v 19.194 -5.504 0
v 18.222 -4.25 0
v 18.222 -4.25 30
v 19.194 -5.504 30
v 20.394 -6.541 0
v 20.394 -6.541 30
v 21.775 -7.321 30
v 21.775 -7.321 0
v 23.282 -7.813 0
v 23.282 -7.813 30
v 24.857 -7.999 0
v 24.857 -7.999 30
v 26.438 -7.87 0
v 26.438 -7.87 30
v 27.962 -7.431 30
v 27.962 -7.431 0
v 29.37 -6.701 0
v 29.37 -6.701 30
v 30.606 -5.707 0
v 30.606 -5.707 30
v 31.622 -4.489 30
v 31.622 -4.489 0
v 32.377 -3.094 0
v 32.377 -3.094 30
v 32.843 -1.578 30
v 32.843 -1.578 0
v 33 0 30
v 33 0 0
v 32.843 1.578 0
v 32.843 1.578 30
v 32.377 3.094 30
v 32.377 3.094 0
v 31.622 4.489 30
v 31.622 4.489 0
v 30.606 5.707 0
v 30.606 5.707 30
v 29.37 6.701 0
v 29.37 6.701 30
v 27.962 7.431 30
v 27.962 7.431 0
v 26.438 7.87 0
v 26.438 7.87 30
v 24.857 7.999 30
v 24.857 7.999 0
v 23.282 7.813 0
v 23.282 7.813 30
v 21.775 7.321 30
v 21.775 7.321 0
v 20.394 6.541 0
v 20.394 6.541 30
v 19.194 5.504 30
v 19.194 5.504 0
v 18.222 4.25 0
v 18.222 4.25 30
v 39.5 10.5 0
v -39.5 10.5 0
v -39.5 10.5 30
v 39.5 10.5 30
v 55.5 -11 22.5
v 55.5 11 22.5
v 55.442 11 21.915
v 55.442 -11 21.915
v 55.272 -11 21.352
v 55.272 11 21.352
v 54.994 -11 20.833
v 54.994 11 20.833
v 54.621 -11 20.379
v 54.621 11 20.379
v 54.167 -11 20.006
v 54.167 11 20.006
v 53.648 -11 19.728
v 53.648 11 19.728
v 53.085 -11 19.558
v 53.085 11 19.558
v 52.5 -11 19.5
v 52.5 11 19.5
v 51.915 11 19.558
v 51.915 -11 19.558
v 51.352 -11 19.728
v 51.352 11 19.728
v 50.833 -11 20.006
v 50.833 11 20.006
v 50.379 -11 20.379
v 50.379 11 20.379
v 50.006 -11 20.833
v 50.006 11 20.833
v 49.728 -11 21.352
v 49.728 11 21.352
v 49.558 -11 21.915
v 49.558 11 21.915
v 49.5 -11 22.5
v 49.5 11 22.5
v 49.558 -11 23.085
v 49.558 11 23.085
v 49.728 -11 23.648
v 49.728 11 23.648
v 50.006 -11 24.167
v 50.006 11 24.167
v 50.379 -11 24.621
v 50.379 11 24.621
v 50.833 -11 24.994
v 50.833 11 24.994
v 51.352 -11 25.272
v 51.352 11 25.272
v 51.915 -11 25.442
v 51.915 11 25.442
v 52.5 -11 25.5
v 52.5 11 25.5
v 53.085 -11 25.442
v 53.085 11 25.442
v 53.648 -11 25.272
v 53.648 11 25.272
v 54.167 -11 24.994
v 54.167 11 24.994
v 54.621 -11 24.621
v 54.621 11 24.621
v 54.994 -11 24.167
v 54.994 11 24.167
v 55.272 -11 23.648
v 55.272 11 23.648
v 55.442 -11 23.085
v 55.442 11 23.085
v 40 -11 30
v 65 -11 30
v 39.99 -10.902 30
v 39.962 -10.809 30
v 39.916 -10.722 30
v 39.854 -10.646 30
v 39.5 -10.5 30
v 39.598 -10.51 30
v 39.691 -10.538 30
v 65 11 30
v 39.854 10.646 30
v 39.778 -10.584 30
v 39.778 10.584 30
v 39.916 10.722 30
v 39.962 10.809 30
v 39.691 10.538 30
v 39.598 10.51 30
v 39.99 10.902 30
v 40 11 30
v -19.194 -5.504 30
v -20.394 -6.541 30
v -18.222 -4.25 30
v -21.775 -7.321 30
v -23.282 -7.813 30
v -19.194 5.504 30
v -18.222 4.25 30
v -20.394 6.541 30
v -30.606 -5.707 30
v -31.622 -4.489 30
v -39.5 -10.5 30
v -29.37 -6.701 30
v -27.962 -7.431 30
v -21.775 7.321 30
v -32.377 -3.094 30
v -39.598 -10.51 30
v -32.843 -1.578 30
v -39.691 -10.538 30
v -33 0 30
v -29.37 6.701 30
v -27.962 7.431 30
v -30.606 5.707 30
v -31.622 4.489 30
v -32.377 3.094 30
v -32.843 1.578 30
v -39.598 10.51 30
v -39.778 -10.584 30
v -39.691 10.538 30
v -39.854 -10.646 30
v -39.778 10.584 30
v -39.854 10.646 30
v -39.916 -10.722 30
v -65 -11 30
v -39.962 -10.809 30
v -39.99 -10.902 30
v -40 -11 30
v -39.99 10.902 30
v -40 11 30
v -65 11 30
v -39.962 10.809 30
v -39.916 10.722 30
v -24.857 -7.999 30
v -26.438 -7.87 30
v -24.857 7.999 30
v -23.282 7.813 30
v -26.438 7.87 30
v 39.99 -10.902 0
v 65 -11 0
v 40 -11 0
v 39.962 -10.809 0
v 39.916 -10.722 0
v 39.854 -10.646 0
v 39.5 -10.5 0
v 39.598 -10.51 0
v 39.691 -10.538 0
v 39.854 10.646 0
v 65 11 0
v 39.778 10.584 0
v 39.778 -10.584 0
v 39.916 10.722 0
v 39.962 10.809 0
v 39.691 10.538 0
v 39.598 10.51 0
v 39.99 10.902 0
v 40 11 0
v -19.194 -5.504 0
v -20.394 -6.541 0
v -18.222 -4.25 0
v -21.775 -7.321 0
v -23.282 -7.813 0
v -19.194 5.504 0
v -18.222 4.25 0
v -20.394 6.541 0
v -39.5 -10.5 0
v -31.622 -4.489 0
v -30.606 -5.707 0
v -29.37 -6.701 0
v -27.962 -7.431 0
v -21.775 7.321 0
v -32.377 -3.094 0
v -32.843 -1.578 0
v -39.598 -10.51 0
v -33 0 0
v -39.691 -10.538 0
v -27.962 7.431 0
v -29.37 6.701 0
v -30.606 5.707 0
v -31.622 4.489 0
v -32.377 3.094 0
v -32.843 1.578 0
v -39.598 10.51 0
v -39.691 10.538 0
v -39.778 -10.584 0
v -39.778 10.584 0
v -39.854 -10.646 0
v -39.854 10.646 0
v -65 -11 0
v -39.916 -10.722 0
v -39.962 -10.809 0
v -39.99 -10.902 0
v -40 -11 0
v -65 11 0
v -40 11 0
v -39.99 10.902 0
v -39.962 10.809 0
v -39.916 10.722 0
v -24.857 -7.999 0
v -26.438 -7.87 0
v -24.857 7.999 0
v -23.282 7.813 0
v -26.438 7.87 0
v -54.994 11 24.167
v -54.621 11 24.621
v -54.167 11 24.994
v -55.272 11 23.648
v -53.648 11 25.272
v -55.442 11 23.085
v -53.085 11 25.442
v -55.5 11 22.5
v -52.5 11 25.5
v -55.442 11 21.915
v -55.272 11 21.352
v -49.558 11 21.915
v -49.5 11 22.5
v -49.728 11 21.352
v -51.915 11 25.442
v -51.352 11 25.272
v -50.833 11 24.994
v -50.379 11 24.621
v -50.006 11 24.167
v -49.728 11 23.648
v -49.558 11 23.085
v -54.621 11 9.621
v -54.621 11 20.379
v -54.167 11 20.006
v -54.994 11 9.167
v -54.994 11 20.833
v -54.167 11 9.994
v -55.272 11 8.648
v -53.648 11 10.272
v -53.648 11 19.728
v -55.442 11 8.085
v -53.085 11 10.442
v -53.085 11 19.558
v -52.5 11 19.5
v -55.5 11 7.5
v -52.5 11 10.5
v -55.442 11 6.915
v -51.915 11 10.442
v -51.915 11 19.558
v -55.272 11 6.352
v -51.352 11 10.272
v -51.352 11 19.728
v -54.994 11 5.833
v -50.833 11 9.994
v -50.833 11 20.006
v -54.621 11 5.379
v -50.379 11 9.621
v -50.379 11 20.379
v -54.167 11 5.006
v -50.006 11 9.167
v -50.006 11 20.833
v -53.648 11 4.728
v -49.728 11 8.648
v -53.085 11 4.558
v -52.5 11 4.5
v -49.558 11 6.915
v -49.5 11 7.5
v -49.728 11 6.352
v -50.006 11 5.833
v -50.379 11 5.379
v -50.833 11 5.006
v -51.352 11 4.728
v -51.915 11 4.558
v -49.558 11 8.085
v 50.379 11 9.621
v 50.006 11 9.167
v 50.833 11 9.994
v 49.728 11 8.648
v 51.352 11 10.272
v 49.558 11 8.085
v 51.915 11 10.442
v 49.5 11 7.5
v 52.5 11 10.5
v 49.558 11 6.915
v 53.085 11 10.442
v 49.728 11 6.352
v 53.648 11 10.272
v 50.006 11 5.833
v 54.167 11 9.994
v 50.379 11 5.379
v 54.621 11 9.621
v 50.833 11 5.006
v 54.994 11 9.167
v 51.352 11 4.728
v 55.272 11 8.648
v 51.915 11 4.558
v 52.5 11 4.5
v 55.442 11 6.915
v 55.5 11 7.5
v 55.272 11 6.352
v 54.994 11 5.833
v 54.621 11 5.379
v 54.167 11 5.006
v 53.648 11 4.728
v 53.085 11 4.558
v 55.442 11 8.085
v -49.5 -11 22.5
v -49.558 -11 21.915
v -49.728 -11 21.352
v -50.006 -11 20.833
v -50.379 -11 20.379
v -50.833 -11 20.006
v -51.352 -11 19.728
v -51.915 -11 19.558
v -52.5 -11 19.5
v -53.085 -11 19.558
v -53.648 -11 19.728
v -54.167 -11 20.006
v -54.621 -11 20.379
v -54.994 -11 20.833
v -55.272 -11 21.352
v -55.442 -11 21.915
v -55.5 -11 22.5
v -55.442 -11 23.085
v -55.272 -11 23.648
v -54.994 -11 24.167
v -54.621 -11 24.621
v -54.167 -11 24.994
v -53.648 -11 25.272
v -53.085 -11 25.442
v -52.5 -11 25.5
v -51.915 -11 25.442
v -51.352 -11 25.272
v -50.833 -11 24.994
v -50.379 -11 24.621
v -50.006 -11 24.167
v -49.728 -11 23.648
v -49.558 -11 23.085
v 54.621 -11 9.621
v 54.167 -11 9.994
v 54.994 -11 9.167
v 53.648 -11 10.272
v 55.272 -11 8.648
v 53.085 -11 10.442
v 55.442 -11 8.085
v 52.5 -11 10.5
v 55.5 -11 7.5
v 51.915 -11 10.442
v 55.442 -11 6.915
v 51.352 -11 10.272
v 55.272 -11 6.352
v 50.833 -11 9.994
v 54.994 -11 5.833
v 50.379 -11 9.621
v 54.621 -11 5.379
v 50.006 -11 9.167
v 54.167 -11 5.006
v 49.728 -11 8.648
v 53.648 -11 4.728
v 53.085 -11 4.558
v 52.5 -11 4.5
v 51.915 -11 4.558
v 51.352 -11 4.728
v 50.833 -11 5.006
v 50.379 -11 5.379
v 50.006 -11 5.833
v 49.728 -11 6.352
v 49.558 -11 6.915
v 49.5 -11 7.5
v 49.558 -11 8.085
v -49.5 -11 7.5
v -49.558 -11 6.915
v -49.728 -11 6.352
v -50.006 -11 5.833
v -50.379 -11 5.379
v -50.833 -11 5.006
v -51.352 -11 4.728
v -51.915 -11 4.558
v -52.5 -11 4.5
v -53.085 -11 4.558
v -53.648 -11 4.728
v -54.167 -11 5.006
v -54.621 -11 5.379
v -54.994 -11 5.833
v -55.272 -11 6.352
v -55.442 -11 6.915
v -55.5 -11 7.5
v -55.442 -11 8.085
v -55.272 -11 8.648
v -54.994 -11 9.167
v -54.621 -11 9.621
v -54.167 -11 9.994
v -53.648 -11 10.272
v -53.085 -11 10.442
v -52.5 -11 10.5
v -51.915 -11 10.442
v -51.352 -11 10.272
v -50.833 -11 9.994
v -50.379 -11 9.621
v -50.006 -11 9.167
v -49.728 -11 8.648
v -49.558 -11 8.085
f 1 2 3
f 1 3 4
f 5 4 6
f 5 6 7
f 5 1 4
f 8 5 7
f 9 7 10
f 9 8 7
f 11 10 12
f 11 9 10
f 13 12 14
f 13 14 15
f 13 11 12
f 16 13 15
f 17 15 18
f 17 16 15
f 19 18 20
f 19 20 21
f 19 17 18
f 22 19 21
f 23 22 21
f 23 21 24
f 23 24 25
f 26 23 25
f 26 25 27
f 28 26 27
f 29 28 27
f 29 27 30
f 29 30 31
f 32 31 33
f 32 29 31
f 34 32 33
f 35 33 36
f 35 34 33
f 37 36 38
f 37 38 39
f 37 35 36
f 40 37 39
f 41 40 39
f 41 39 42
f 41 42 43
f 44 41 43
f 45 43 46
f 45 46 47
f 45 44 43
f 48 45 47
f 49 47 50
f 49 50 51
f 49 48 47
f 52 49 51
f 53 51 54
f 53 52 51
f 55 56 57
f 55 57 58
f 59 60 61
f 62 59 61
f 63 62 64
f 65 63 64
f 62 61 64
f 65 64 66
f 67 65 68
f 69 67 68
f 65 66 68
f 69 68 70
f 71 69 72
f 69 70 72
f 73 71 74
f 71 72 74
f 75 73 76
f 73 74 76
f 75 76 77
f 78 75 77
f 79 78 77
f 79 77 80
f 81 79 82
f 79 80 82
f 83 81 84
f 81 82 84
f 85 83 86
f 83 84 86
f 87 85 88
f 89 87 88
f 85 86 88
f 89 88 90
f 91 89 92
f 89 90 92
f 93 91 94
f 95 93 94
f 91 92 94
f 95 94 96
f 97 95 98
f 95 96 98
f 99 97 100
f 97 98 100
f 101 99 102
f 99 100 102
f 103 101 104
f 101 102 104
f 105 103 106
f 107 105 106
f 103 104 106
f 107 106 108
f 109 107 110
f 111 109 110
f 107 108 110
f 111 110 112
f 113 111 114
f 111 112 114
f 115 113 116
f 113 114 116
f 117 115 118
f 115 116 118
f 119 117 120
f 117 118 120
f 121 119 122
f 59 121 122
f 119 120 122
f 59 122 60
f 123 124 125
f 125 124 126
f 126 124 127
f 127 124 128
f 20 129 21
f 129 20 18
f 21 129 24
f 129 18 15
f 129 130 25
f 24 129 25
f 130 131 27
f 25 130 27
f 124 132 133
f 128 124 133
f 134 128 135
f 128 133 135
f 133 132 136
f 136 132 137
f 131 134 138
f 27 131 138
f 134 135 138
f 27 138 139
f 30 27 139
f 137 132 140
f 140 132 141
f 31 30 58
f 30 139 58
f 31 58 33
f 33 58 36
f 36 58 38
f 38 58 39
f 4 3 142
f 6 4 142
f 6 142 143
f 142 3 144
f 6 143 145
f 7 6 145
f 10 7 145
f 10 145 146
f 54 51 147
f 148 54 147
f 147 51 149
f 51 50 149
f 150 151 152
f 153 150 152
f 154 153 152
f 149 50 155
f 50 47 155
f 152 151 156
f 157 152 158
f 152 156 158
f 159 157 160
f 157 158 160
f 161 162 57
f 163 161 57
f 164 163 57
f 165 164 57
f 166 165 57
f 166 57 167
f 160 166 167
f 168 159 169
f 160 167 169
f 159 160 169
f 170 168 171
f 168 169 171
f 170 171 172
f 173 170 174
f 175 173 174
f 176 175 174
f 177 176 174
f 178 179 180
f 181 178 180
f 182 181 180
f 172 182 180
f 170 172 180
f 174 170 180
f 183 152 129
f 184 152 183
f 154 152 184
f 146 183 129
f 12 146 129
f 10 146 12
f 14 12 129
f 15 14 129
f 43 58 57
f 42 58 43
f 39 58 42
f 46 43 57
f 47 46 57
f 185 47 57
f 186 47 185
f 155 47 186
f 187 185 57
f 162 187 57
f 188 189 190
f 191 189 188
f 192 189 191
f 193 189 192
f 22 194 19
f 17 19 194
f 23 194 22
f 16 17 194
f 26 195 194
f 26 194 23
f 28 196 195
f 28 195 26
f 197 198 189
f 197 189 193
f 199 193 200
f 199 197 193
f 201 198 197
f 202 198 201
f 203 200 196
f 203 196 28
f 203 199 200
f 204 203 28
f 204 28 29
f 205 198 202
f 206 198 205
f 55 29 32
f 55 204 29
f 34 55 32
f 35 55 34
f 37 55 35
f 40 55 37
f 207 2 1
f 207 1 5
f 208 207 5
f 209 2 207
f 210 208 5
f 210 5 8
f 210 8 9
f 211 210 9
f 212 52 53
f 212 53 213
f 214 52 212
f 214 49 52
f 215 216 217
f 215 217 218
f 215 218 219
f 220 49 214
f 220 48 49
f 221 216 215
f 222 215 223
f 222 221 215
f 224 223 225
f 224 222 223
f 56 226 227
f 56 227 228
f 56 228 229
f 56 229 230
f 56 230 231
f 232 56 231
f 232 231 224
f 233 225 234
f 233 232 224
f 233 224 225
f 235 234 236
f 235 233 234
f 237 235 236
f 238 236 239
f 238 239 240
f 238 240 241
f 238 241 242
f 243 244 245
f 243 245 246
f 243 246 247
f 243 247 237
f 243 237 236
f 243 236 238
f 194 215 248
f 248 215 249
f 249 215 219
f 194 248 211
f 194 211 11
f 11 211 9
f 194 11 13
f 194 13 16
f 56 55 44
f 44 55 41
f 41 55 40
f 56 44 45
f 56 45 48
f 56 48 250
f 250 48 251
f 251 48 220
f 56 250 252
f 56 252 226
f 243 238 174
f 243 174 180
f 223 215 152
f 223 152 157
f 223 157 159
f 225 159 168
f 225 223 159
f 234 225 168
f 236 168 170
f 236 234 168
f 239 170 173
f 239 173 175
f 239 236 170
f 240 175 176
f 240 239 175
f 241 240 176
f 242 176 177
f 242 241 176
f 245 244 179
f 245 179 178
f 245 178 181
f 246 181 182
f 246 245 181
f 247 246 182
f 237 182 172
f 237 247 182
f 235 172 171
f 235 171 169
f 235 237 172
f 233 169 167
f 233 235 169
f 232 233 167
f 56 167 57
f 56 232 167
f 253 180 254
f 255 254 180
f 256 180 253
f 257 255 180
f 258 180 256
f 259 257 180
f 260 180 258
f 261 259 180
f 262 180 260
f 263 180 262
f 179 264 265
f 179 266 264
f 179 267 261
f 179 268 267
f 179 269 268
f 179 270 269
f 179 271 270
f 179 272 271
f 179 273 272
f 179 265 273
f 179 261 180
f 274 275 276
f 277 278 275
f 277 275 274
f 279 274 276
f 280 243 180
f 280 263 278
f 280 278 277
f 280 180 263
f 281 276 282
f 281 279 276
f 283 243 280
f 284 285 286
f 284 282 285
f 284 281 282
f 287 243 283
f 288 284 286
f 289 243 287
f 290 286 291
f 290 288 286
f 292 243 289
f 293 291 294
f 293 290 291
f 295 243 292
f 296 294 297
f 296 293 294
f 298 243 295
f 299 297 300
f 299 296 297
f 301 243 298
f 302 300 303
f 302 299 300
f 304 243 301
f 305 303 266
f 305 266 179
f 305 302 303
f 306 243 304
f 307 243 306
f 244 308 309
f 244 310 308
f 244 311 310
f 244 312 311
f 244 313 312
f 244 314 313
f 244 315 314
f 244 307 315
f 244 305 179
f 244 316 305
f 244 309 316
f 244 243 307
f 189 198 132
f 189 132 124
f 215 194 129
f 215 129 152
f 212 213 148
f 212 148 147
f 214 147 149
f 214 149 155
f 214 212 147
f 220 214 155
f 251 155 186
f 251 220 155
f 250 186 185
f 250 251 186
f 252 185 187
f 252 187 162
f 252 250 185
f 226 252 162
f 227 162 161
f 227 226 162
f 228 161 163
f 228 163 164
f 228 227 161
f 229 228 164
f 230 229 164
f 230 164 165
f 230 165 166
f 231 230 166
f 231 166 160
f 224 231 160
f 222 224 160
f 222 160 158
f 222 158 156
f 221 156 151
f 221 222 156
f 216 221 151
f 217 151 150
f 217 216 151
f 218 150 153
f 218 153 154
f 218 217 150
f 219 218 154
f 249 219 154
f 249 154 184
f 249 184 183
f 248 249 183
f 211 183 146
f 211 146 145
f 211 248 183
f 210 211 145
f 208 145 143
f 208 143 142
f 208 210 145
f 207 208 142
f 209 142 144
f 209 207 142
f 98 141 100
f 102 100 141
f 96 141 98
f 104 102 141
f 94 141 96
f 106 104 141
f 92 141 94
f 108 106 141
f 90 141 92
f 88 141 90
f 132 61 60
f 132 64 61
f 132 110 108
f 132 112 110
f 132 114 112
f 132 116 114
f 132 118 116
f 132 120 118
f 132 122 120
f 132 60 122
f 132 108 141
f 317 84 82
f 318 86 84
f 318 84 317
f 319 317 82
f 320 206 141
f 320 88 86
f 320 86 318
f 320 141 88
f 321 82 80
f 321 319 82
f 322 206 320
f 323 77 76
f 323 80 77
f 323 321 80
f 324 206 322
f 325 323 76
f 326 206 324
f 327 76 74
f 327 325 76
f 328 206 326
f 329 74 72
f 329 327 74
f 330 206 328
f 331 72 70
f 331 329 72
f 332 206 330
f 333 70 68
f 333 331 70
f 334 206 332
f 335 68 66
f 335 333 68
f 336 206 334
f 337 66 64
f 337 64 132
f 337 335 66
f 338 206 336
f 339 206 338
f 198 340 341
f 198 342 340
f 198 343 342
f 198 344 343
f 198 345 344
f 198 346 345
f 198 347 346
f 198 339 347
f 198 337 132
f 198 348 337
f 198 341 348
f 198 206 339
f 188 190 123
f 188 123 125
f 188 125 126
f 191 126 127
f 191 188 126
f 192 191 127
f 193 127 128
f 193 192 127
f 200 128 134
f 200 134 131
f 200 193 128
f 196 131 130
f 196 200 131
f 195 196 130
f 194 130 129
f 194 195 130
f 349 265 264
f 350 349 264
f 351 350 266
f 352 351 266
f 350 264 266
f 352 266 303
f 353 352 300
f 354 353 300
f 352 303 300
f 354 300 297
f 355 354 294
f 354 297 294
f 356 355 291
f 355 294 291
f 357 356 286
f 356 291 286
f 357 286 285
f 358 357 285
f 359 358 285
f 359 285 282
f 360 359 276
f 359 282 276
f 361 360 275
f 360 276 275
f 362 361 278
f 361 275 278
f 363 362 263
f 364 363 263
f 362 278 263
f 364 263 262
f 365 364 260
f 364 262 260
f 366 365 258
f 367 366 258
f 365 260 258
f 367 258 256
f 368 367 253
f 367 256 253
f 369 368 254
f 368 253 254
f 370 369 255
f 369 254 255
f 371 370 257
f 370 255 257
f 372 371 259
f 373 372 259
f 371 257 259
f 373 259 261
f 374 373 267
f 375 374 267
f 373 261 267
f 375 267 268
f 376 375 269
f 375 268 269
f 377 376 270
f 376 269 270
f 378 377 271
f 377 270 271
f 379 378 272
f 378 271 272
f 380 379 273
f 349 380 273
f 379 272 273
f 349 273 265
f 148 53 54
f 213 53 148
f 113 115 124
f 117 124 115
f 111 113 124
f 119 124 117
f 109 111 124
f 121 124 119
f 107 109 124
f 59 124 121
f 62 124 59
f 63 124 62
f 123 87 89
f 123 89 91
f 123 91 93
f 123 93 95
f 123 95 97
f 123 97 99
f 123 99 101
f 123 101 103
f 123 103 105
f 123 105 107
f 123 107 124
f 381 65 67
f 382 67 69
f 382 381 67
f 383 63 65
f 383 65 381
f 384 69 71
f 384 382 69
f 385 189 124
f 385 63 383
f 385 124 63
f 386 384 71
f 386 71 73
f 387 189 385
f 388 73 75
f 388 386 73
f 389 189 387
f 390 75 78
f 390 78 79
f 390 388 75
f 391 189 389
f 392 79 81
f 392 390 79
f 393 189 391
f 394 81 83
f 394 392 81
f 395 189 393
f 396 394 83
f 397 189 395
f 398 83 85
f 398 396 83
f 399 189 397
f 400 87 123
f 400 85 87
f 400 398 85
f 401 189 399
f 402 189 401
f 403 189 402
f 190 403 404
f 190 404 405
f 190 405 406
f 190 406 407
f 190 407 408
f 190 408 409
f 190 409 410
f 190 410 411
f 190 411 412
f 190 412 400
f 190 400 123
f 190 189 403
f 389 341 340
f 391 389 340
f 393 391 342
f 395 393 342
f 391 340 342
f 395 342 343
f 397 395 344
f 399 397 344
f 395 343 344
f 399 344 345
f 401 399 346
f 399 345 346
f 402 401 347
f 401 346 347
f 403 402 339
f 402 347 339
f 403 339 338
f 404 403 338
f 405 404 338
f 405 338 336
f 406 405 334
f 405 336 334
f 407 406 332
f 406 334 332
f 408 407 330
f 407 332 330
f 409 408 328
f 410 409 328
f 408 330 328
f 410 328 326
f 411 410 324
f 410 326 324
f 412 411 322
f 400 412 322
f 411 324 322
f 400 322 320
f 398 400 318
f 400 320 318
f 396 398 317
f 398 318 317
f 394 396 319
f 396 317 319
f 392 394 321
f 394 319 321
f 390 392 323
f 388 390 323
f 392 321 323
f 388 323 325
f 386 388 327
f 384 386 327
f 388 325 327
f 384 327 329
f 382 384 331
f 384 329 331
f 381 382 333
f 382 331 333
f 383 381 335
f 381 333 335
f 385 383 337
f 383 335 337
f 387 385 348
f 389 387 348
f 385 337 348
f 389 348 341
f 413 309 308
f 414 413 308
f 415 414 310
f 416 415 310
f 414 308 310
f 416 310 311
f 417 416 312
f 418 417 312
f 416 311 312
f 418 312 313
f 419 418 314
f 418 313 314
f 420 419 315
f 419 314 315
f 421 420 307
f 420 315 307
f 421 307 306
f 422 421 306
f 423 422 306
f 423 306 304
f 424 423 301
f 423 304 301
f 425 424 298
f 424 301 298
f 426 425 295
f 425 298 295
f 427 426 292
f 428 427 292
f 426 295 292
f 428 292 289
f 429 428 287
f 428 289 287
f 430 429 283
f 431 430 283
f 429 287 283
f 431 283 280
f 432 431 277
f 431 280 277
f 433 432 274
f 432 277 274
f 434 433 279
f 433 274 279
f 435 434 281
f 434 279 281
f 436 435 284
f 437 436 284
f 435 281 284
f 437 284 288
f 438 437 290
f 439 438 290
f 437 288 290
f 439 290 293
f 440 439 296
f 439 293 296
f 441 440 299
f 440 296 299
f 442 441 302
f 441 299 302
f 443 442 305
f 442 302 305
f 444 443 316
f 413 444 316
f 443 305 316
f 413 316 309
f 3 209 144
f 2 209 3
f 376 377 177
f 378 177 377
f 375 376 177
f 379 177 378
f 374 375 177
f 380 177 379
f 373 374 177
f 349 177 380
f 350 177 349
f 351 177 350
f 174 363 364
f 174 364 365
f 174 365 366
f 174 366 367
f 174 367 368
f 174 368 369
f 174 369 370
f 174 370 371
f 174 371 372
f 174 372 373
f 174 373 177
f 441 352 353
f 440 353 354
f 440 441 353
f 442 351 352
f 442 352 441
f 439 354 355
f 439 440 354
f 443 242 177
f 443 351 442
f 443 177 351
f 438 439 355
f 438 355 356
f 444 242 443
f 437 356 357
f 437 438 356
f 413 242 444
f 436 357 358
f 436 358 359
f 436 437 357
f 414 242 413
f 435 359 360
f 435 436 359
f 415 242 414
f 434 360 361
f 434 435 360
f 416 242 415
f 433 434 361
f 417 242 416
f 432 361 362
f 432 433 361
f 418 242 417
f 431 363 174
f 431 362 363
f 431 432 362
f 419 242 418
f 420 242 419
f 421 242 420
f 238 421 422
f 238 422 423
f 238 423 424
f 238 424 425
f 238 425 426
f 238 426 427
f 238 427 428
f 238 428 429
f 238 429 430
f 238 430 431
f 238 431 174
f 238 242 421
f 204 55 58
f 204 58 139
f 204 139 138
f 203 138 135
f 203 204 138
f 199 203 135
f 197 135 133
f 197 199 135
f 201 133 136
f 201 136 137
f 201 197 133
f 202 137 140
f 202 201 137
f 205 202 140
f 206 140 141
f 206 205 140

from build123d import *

# Parameters (mm, degrees)
EXTRUDE_1_DEPTH     = 30
SKETCH_2_R          = 3
CUT_EXTRUDE_1_DEPTH = 22
CUT_EXTRUDE_2_DEPTH = 30


with BuildPart() as part:
    # 스케치1 → 보스-돌출1 (new body)
    with BuildSketch(Plane.XY):
        with BuildLine():
            Line((40, 11), (65, 11))
            Line((65, 11), (65, -11))
            Line((65, -11), (40, -11))
            ThreePointArc((40, -11), (39.853553391, -10.646446609), (39.5, -10.5))
            Line((39.5, -10.5), (-39.5, -10.5))
            ThreePointArc((-39.5, -10.5), (-39.853553391, -10.646446609), (-40, -11))
            Line((-40, -11), (-65, -11))
            Line((-65, -11), (-65, 11))
            Line((-65, 11), (-40, 11))
            ThreePointArc((-40, 11), (-39.853553391, 10.646446609), (-39.5, 10.5))
            Line((-39.5, 10.5), (39.5, 10.5))
            ThreePointArc((39.5, 10.5), (39.853553391, 10.646446609), (40, 11))
        make_face()
    extrude(amount=EXTRUDE_1_DEPTH)

    # 스케치2 → 컷-돌출1 (cut)
    with BuildSketch(Plane(origin=(0, 11, 0), x_dir=(1, 0, 0), z_dir=(0, 1, 0))):
        with Locations((52.5, -7.5)):
            Circle(SKETCH_2_R)
        with Locations((52.5, -22.5)):
            Circle(SKETCH_2_R)
        with Locations((-52.5, -7.5)):
            Circle(SKETCH_2_R)
        with Locations((-52.5, -22.5)):
            Circle(SKETCH_2_R)
    extrude(amount=-CUT_EXTRUDE_1_DEPTH, mode=Mode.SUBTRACT)

    # 스케치4 → 컷-돌출2 (cut)
    with BuildSketch(Plane(origin=(0, 0, 0), x_dir=(-1, 0, 0), z_dir=(0, 0, -1))):
        with BuildLine():
            Line((-18.222279144, 4.25), (18.222279144, 4.25))
            ThreePointArc((18.222279144, 4.25), (33, 0), (18.222279144, -4.25))
            Line((18.222279144, -4.25), (-18.222279144, -4.25))
            ThreePointArc((-18.222279144, -4.25), (-33, 0), (-18.222279144, 4.25))
        make_face()
    extrude(amount=-CUT_EXTRUDE_2_DEPTH, mode=Mode.SUBTRACT)


solid = part.part
